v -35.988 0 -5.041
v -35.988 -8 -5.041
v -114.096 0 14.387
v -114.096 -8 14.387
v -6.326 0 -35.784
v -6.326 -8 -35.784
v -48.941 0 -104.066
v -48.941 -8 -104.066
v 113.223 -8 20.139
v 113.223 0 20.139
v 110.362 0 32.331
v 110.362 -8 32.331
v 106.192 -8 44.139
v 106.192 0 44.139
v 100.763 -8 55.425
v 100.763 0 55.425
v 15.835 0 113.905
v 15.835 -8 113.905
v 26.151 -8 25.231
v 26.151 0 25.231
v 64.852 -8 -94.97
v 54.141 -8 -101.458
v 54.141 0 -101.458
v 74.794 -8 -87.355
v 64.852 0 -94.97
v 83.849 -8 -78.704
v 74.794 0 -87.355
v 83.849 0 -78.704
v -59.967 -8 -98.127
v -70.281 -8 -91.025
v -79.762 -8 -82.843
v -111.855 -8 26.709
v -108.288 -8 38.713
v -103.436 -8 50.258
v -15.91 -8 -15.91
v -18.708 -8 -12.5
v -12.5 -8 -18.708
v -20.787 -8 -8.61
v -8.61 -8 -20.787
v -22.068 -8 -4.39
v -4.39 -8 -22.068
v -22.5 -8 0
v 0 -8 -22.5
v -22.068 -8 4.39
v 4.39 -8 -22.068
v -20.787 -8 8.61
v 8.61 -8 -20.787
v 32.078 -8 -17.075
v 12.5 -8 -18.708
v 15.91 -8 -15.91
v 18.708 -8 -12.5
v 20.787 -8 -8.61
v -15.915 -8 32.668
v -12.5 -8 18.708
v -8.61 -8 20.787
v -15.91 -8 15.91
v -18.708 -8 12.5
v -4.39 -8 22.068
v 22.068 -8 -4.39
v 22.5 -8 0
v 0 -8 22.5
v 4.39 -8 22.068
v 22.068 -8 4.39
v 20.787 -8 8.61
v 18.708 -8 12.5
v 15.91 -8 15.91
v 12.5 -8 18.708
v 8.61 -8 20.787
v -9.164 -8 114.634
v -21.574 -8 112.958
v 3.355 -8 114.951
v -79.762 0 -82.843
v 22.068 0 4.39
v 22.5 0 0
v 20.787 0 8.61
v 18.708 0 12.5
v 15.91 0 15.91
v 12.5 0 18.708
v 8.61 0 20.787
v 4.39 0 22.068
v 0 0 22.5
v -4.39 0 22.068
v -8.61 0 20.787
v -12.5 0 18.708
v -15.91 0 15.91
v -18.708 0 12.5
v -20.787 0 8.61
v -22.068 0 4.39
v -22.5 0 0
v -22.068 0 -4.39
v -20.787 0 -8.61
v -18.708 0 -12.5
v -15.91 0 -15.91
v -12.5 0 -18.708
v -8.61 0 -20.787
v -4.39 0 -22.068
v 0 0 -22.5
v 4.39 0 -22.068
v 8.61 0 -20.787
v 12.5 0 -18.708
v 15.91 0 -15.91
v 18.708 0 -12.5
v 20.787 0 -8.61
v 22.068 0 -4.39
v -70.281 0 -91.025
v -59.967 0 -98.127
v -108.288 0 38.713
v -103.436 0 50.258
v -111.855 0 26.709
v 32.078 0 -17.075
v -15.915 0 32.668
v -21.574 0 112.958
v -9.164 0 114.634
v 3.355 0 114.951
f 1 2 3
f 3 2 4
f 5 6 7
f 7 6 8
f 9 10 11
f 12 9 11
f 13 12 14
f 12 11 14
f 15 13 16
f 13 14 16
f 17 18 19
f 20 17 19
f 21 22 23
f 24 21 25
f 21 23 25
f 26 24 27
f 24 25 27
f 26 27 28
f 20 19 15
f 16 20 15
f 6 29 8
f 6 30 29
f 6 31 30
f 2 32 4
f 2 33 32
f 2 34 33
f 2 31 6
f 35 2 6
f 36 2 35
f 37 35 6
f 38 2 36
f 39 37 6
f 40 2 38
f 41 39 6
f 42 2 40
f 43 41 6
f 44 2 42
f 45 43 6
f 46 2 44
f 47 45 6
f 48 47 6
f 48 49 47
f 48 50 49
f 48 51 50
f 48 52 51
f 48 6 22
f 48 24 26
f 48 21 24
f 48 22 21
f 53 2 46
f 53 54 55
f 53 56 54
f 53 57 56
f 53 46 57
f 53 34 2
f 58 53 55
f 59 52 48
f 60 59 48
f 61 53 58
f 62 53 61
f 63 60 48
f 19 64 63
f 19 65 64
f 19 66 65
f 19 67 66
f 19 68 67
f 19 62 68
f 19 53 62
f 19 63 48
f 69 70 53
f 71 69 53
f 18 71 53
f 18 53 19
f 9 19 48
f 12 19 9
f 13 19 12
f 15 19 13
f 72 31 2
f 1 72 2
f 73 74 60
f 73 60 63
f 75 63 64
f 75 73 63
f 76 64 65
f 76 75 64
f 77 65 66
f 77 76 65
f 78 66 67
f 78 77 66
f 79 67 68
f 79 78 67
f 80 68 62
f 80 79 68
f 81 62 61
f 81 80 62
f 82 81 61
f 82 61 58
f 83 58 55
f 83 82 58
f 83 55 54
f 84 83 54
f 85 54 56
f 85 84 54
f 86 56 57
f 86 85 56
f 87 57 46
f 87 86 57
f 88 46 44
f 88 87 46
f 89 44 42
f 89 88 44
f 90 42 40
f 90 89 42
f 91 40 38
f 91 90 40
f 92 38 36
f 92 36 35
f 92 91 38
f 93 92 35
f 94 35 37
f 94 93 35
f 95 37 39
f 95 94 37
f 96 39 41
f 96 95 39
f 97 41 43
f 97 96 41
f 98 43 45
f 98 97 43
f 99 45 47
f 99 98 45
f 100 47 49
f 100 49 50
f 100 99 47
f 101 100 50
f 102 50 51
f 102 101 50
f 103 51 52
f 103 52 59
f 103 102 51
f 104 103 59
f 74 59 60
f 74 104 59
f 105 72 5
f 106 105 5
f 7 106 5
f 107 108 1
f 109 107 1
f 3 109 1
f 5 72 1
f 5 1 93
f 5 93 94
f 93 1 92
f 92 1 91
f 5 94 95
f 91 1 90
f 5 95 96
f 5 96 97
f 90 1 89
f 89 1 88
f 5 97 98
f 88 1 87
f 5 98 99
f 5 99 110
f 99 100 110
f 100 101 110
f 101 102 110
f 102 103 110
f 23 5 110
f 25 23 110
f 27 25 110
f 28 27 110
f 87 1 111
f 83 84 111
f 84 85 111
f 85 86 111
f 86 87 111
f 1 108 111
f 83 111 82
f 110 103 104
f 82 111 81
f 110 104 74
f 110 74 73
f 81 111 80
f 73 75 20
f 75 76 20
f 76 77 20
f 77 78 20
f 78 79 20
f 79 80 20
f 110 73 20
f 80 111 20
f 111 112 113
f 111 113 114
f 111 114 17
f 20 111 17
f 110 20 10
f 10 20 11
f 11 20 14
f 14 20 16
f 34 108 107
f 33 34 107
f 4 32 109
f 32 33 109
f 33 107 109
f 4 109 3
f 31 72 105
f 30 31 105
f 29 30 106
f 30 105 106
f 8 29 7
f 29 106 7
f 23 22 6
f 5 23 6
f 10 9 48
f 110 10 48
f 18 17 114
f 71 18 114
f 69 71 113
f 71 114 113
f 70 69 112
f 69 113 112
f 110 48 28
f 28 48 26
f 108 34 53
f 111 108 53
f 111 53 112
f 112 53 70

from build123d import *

# Parameters (mm, degrees)
F0_R            = 115
F0_R_2          = 22.5
F1_DEPTH        = 8
F3_DEPTH        = 25
F3_COPIES_COUNT = 5


# Not quite as in the source:
# - a pattern or mirror of a feature is missing from the dataset's text; its kind, count and spacing are read off the source's solid


with BuildPart() as f1:
    # F0 (on Front) → F1 (new body)
    with BuildSketch(Plane.XZ):
        Circle(F0_R)
        Circle(F0_R_2, mode=Mode.SUBTRACT)
    extrude(amount=F1_DEPTH)

    # F2 (on face) → F3 (cut)
    with BuildSketch(Plane.XZ.offset(8)):
        Polygon((100.7627065135, 144.0385852402), (15.8349641698, 113.9045824791), (26.1514205486, 25.2313297242), (100.7627065135, 55.4245160203), align=None)
    f3 = extrude(amount=-F3_DEPTH, mode=Mode.SUBTRACT)

    # F3_copies: F3 ×5 about axis
    f3_copies_axis = Axis((0, 0, 0), (0, 1, 0))
    for i in range(1, F3_COPIES_COUNT):
        add(f3.rotate(f3_copies_axis, i * 360 / F3_COPIES_COUNT), mode=Mode.SUBTRACT)


solid = f1.part
